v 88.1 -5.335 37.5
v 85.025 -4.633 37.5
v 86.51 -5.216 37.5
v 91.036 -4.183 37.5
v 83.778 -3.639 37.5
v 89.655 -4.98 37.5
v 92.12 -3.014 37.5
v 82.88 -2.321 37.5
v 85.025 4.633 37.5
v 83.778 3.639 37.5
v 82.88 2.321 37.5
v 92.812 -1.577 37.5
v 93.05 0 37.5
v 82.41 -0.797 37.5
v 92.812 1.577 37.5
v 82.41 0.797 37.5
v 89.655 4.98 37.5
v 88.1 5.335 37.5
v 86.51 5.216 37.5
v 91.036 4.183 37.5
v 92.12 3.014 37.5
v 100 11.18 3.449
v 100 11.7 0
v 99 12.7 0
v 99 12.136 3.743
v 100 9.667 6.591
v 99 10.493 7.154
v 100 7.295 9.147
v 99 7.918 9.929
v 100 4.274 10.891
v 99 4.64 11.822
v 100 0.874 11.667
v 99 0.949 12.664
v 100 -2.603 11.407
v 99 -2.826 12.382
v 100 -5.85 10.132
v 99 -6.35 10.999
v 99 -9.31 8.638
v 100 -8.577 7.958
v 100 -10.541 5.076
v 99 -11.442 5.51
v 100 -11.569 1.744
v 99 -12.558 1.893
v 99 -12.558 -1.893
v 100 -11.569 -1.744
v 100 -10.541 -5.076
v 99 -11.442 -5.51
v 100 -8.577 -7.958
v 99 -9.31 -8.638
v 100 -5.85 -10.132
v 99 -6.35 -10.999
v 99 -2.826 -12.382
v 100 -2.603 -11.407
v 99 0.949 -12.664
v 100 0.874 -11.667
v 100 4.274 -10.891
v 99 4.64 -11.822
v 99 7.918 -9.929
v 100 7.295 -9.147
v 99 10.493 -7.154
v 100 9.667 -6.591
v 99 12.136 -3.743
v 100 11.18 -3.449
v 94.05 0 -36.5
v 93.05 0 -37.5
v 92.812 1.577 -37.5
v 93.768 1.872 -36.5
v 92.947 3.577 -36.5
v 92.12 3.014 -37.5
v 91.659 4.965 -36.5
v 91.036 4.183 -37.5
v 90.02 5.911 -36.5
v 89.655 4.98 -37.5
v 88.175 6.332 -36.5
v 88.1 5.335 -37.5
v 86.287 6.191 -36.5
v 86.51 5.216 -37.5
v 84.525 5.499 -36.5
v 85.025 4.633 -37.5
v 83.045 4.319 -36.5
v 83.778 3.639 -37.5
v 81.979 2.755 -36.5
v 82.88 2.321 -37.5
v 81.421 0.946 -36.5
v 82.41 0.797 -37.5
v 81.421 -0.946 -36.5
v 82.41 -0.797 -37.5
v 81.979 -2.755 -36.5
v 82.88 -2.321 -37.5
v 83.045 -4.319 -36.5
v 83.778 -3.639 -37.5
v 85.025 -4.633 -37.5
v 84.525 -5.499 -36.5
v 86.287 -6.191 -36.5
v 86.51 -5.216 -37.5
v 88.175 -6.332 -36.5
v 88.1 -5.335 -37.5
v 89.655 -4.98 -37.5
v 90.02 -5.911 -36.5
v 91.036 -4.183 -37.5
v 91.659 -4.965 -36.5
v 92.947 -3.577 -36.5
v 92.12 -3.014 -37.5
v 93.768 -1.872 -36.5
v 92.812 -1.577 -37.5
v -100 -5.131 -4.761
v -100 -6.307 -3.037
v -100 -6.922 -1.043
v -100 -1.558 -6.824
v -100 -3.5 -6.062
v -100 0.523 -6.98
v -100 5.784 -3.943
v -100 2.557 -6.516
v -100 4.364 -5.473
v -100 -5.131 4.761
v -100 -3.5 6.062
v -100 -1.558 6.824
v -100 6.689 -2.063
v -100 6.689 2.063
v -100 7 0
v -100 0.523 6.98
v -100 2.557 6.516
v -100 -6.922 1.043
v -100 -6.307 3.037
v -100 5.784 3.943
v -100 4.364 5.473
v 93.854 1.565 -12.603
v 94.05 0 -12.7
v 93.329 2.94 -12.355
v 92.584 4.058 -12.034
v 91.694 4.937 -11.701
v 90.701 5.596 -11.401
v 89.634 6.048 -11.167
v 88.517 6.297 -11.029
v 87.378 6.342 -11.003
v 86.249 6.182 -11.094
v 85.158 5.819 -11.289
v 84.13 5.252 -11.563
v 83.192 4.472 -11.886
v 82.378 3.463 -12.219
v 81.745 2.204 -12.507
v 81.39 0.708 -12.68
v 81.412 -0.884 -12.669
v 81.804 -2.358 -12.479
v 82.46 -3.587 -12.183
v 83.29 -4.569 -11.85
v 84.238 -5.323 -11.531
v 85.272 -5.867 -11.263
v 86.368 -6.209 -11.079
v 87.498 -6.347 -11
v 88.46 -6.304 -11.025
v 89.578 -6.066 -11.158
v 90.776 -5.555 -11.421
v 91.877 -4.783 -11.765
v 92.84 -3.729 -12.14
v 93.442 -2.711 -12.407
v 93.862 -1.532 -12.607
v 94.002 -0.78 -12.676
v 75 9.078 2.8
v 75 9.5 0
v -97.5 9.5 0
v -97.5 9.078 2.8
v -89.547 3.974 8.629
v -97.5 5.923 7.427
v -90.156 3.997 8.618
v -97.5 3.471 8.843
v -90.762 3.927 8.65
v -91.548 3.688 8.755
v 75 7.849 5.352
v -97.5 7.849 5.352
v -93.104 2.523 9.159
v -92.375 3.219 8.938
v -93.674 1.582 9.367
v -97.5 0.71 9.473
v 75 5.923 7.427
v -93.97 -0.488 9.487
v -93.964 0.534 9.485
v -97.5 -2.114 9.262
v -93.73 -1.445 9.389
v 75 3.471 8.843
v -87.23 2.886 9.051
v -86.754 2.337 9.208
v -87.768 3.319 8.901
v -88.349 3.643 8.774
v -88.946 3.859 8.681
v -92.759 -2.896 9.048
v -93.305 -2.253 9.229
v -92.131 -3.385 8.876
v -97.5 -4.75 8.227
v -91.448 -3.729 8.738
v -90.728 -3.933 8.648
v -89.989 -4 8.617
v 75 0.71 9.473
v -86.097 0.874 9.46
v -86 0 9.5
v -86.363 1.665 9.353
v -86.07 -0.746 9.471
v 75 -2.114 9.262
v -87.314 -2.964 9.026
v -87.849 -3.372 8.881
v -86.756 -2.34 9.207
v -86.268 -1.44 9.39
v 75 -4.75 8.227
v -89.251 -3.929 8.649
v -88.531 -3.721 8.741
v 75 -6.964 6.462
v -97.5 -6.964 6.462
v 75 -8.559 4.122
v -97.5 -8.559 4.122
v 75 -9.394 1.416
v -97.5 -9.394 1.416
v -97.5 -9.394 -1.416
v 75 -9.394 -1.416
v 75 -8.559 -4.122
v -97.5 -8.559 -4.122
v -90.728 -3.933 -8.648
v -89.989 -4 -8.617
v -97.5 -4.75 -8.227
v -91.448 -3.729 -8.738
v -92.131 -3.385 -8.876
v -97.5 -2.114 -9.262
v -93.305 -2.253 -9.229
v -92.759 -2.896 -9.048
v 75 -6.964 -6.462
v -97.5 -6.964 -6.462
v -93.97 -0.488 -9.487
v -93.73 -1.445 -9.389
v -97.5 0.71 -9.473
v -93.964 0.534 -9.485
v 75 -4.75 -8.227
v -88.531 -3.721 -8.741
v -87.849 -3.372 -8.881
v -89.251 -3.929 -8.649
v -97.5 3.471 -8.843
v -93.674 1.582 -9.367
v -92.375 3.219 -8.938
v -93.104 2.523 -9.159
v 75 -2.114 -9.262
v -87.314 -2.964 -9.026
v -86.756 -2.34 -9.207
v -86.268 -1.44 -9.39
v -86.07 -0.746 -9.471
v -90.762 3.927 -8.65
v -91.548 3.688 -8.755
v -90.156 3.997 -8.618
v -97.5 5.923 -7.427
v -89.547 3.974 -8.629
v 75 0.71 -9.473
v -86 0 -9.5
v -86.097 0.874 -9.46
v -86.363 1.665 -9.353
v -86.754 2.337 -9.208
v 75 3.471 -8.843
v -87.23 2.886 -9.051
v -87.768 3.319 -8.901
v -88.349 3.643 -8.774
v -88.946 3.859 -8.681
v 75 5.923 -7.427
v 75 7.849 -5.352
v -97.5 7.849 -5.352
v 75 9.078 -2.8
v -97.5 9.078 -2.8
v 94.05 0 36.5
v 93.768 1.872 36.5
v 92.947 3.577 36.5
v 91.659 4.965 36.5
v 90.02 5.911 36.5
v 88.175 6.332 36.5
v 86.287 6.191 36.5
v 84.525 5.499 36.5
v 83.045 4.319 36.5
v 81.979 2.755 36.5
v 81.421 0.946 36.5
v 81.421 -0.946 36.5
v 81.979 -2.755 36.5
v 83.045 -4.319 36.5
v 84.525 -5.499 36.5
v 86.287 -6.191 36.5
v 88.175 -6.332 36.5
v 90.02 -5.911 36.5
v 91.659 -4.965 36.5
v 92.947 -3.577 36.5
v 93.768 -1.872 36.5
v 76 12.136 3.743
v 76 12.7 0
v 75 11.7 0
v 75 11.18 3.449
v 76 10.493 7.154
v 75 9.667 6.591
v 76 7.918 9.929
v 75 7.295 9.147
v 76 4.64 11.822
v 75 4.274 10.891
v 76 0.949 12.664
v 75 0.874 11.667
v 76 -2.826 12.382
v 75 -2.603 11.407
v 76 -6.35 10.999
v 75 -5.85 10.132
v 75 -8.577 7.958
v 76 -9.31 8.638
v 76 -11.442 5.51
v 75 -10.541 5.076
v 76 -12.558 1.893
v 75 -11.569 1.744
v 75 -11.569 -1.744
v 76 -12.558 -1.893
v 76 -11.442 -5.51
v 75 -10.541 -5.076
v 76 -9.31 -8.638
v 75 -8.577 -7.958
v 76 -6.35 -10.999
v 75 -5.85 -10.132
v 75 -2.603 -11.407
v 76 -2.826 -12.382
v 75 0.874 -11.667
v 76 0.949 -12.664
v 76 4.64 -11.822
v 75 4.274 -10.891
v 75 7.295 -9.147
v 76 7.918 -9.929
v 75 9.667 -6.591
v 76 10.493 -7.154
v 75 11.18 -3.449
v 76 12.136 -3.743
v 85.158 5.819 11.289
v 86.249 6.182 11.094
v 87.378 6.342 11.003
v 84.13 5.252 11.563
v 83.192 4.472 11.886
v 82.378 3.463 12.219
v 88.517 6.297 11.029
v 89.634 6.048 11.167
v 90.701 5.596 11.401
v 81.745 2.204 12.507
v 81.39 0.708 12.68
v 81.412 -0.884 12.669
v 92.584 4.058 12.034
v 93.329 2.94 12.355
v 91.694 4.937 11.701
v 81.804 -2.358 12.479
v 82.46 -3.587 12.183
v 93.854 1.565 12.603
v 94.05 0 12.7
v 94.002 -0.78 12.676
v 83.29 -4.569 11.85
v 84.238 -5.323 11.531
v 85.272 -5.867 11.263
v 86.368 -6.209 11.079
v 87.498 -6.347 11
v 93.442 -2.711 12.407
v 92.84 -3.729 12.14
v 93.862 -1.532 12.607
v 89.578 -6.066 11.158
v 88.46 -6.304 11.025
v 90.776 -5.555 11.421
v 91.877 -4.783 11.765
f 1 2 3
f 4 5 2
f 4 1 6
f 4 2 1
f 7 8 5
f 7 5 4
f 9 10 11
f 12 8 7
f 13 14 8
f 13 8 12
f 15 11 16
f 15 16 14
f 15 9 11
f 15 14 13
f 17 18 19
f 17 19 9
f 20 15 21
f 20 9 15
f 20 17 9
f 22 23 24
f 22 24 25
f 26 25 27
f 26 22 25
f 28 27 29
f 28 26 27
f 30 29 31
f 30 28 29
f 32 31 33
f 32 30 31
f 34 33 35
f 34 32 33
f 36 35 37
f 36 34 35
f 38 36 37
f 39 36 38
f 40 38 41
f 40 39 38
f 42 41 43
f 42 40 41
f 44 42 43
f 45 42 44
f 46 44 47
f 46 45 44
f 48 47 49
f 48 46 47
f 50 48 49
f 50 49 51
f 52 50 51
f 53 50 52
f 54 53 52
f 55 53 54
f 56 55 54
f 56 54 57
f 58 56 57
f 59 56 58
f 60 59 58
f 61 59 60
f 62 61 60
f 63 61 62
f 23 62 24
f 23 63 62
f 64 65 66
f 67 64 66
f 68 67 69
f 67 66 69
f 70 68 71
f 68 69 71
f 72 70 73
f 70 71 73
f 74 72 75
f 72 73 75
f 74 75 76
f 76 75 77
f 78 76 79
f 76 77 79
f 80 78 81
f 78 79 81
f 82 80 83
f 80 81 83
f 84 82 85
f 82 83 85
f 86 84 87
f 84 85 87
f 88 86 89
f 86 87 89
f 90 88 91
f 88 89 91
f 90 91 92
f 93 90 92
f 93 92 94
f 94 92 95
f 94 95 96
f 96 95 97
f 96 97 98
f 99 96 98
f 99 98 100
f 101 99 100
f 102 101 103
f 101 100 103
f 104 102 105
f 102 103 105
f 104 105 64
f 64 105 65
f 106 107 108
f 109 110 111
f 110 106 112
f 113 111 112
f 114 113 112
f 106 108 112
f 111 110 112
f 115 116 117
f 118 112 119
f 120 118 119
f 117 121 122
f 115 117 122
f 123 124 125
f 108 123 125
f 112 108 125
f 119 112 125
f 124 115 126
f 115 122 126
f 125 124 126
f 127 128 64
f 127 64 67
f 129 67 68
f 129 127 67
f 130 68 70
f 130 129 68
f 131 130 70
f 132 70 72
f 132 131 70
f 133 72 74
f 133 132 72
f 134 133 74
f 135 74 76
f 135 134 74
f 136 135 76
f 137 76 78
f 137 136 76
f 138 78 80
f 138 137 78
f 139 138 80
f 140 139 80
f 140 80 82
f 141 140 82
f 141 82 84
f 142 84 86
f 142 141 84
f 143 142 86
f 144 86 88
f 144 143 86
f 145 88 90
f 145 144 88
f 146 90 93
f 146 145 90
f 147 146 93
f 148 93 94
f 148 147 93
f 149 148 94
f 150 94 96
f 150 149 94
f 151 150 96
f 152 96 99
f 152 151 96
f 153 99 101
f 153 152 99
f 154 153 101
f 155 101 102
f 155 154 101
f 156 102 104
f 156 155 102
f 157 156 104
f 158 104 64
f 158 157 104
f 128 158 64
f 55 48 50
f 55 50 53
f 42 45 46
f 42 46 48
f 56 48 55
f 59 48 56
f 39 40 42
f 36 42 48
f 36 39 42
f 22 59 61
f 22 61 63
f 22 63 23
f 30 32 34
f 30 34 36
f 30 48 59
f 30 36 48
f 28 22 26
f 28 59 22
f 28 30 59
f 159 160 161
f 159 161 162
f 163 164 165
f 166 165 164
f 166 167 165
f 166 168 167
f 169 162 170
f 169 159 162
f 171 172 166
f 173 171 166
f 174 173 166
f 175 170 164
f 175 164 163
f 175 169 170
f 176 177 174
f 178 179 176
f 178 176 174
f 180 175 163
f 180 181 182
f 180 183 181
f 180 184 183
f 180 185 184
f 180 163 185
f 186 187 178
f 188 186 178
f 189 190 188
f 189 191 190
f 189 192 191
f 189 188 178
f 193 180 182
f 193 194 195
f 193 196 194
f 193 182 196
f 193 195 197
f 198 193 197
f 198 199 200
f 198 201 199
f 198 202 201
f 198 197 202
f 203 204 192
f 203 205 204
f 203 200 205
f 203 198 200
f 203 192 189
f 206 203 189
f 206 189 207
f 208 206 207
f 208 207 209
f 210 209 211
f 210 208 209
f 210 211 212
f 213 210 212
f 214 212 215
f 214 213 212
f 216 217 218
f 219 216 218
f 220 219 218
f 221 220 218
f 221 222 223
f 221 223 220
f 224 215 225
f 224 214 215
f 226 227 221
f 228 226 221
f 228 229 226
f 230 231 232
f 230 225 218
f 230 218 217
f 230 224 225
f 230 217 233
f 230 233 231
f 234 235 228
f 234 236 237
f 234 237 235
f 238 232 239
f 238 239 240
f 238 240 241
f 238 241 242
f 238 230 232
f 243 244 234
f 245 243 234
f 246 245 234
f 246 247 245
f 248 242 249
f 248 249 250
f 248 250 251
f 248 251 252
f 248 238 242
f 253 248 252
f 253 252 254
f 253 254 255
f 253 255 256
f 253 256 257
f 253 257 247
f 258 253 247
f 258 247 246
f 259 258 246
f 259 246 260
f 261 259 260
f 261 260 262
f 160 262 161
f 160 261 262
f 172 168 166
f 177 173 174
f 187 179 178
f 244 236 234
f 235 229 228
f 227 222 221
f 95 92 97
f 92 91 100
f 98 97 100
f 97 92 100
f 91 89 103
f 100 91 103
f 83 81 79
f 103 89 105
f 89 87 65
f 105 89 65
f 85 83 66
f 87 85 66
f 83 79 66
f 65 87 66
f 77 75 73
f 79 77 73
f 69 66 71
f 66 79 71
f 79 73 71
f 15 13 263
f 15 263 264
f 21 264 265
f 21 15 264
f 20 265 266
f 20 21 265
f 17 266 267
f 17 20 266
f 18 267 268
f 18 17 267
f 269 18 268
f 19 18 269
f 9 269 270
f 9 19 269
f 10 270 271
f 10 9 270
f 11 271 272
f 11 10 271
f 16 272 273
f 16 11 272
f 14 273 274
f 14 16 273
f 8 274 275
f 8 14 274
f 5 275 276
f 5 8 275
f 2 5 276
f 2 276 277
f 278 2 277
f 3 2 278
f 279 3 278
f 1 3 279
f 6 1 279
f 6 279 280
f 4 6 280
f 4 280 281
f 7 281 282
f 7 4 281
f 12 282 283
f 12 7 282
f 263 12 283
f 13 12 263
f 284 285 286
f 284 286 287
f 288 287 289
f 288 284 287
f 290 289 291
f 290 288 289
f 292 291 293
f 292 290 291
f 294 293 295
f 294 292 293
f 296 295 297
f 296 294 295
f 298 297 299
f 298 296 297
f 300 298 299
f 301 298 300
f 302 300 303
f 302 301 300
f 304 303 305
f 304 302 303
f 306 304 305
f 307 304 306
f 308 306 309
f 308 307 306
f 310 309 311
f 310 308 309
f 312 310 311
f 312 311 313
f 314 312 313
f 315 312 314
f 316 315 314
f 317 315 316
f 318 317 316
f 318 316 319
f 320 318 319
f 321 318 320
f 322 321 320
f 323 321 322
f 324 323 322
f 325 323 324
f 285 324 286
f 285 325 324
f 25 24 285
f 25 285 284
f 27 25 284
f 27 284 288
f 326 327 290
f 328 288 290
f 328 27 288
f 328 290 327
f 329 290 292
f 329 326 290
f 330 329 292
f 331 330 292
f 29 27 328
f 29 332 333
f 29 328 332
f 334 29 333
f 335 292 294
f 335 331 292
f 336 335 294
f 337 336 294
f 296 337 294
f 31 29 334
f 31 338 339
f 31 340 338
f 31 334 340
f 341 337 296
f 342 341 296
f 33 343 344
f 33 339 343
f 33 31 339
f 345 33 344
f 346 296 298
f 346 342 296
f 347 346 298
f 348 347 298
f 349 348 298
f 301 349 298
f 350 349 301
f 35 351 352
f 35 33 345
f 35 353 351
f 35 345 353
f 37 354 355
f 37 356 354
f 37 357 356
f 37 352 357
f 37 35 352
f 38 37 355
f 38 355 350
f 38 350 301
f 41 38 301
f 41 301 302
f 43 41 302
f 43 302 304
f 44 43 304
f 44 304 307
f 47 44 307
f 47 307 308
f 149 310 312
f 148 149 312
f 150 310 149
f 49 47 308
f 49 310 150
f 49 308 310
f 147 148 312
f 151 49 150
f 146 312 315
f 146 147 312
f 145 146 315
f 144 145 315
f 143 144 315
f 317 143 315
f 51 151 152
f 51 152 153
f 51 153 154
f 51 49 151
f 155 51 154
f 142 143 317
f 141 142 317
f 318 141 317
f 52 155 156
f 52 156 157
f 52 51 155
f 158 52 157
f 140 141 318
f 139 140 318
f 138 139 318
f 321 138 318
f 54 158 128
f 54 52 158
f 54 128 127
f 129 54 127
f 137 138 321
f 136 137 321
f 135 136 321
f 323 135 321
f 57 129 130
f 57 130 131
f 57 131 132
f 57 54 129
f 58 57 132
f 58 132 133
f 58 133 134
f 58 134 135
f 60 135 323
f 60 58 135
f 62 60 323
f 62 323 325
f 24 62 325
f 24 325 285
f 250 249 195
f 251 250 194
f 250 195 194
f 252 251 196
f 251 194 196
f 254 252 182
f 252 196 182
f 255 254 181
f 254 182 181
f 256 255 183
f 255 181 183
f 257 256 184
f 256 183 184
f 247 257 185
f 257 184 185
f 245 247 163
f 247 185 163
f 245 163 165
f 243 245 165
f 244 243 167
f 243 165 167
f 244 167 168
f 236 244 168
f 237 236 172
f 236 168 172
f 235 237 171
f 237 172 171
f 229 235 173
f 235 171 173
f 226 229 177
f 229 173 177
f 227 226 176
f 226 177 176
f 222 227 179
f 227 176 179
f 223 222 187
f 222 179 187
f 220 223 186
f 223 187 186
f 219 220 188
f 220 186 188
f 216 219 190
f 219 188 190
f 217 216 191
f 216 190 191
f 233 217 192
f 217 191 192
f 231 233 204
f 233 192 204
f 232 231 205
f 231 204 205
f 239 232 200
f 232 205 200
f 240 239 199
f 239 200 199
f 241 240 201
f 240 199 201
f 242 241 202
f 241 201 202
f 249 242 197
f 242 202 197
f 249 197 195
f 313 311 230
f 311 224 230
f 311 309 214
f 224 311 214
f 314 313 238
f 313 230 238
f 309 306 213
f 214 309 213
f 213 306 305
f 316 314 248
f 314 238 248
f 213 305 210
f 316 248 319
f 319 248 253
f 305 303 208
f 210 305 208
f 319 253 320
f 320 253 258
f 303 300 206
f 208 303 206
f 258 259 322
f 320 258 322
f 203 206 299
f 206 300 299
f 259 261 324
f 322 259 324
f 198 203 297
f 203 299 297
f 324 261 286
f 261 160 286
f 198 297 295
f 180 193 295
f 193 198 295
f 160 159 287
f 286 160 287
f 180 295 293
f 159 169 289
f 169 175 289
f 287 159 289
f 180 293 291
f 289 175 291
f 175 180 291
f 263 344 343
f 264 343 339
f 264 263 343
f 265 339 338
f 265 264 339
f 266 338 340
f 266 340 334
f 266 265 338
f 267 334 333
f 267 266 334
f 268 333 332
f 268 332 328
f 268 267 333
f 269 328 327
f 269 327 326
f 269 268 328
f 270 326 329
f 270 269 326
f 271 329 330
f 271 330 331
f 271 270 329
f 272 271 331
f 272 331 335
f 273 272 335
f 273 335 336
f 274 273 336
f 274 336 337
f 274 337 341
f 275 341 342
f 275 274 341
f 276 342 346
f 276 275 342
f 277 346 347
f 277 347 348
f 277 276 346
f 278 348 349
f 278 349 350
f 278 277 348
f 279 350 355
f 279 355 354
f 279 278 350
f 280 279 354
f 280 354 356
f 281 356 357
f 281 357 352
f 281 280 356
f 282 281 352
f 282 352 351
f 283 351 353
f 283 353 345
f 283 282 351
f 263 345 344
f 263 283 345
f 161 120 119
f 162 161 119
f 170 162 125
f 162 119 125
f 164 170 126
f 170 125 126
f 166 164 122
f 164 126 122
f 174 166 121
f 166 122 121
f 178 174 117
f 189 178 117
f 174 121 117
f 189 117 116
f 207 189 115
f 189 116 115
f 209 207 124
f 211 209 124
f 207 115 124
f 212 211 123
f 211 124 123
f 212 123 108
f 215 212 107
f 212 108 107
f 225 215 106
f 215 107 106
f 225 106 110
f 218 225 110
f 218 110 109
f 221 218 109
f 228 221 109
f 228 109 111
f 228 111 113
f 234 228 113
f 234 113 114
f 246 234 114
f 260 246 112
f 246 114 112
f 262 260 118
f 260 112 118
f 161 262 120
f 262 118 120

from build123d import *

# Parameters (mm, degrees)
F0_R     = 9.5
F1_DEPTH = 100
F2_R     = 12.7
F2_R_2   = 9.5
F3_DEPTH = 25
F4_R     = 6.35
F5_DEPTH = 37.5
F4_R_2   = 4
F6_DEPTH = 12.5
F7_SIZE  = 2.5
F8_SIZE  = 1


with BuildPart() as f1:
    # F0 (on Right) → F1 (new body, symmetric)
    with BuildSketch(Plane.YZ):
        Circle(F0_R)
    extrude(amount=F1_DEPTH, both=True)

    # F2 (on face) → F3 (join)
    with BuildSketch(Plane.YZ.offset(100)):
        Circle(F2_R)
        Circle(F2_R_2, mode=Mode.SUBTRACT)
    extrude(amount=-F3_DEPTH)

    # F4 (on Top) → F5 (join, symmetric)
    with BuildSketch(Plane.XY):
        with Locations((87.7, 0)):
            Circle(F4_R)
    extrude(amount=F5_DEPTH, both=True)

    # F4 (on Top) → F6 (cut, symmetric)
    with BuildSketch(Plane.XY):
        with Locations((-90, 0)):
            Circle(F4_R_2)
    extrude(amount=F6_DEPTH, both=True, mode=Mode.SUBTRACT)

    # F7
    f7_edges = [f1.edges().sort_by_distance(p)[0] for p in [
        (-100, -9.5, 0),
    ]]
    chamfer(f7_edges, length=F7_SIZE)

    # F8
    f8_edges = [f1.edges().sort_by_distance(p)[0] for p in [
        (75, -12.7, 0),
        (100, -12.7, 0),
        (81.35, 0, -37.5),
        (81.35, 0, 37.5),
    ]]
    chamfer(f8_edges, length=F8_SIZE)


solid = f1.part
